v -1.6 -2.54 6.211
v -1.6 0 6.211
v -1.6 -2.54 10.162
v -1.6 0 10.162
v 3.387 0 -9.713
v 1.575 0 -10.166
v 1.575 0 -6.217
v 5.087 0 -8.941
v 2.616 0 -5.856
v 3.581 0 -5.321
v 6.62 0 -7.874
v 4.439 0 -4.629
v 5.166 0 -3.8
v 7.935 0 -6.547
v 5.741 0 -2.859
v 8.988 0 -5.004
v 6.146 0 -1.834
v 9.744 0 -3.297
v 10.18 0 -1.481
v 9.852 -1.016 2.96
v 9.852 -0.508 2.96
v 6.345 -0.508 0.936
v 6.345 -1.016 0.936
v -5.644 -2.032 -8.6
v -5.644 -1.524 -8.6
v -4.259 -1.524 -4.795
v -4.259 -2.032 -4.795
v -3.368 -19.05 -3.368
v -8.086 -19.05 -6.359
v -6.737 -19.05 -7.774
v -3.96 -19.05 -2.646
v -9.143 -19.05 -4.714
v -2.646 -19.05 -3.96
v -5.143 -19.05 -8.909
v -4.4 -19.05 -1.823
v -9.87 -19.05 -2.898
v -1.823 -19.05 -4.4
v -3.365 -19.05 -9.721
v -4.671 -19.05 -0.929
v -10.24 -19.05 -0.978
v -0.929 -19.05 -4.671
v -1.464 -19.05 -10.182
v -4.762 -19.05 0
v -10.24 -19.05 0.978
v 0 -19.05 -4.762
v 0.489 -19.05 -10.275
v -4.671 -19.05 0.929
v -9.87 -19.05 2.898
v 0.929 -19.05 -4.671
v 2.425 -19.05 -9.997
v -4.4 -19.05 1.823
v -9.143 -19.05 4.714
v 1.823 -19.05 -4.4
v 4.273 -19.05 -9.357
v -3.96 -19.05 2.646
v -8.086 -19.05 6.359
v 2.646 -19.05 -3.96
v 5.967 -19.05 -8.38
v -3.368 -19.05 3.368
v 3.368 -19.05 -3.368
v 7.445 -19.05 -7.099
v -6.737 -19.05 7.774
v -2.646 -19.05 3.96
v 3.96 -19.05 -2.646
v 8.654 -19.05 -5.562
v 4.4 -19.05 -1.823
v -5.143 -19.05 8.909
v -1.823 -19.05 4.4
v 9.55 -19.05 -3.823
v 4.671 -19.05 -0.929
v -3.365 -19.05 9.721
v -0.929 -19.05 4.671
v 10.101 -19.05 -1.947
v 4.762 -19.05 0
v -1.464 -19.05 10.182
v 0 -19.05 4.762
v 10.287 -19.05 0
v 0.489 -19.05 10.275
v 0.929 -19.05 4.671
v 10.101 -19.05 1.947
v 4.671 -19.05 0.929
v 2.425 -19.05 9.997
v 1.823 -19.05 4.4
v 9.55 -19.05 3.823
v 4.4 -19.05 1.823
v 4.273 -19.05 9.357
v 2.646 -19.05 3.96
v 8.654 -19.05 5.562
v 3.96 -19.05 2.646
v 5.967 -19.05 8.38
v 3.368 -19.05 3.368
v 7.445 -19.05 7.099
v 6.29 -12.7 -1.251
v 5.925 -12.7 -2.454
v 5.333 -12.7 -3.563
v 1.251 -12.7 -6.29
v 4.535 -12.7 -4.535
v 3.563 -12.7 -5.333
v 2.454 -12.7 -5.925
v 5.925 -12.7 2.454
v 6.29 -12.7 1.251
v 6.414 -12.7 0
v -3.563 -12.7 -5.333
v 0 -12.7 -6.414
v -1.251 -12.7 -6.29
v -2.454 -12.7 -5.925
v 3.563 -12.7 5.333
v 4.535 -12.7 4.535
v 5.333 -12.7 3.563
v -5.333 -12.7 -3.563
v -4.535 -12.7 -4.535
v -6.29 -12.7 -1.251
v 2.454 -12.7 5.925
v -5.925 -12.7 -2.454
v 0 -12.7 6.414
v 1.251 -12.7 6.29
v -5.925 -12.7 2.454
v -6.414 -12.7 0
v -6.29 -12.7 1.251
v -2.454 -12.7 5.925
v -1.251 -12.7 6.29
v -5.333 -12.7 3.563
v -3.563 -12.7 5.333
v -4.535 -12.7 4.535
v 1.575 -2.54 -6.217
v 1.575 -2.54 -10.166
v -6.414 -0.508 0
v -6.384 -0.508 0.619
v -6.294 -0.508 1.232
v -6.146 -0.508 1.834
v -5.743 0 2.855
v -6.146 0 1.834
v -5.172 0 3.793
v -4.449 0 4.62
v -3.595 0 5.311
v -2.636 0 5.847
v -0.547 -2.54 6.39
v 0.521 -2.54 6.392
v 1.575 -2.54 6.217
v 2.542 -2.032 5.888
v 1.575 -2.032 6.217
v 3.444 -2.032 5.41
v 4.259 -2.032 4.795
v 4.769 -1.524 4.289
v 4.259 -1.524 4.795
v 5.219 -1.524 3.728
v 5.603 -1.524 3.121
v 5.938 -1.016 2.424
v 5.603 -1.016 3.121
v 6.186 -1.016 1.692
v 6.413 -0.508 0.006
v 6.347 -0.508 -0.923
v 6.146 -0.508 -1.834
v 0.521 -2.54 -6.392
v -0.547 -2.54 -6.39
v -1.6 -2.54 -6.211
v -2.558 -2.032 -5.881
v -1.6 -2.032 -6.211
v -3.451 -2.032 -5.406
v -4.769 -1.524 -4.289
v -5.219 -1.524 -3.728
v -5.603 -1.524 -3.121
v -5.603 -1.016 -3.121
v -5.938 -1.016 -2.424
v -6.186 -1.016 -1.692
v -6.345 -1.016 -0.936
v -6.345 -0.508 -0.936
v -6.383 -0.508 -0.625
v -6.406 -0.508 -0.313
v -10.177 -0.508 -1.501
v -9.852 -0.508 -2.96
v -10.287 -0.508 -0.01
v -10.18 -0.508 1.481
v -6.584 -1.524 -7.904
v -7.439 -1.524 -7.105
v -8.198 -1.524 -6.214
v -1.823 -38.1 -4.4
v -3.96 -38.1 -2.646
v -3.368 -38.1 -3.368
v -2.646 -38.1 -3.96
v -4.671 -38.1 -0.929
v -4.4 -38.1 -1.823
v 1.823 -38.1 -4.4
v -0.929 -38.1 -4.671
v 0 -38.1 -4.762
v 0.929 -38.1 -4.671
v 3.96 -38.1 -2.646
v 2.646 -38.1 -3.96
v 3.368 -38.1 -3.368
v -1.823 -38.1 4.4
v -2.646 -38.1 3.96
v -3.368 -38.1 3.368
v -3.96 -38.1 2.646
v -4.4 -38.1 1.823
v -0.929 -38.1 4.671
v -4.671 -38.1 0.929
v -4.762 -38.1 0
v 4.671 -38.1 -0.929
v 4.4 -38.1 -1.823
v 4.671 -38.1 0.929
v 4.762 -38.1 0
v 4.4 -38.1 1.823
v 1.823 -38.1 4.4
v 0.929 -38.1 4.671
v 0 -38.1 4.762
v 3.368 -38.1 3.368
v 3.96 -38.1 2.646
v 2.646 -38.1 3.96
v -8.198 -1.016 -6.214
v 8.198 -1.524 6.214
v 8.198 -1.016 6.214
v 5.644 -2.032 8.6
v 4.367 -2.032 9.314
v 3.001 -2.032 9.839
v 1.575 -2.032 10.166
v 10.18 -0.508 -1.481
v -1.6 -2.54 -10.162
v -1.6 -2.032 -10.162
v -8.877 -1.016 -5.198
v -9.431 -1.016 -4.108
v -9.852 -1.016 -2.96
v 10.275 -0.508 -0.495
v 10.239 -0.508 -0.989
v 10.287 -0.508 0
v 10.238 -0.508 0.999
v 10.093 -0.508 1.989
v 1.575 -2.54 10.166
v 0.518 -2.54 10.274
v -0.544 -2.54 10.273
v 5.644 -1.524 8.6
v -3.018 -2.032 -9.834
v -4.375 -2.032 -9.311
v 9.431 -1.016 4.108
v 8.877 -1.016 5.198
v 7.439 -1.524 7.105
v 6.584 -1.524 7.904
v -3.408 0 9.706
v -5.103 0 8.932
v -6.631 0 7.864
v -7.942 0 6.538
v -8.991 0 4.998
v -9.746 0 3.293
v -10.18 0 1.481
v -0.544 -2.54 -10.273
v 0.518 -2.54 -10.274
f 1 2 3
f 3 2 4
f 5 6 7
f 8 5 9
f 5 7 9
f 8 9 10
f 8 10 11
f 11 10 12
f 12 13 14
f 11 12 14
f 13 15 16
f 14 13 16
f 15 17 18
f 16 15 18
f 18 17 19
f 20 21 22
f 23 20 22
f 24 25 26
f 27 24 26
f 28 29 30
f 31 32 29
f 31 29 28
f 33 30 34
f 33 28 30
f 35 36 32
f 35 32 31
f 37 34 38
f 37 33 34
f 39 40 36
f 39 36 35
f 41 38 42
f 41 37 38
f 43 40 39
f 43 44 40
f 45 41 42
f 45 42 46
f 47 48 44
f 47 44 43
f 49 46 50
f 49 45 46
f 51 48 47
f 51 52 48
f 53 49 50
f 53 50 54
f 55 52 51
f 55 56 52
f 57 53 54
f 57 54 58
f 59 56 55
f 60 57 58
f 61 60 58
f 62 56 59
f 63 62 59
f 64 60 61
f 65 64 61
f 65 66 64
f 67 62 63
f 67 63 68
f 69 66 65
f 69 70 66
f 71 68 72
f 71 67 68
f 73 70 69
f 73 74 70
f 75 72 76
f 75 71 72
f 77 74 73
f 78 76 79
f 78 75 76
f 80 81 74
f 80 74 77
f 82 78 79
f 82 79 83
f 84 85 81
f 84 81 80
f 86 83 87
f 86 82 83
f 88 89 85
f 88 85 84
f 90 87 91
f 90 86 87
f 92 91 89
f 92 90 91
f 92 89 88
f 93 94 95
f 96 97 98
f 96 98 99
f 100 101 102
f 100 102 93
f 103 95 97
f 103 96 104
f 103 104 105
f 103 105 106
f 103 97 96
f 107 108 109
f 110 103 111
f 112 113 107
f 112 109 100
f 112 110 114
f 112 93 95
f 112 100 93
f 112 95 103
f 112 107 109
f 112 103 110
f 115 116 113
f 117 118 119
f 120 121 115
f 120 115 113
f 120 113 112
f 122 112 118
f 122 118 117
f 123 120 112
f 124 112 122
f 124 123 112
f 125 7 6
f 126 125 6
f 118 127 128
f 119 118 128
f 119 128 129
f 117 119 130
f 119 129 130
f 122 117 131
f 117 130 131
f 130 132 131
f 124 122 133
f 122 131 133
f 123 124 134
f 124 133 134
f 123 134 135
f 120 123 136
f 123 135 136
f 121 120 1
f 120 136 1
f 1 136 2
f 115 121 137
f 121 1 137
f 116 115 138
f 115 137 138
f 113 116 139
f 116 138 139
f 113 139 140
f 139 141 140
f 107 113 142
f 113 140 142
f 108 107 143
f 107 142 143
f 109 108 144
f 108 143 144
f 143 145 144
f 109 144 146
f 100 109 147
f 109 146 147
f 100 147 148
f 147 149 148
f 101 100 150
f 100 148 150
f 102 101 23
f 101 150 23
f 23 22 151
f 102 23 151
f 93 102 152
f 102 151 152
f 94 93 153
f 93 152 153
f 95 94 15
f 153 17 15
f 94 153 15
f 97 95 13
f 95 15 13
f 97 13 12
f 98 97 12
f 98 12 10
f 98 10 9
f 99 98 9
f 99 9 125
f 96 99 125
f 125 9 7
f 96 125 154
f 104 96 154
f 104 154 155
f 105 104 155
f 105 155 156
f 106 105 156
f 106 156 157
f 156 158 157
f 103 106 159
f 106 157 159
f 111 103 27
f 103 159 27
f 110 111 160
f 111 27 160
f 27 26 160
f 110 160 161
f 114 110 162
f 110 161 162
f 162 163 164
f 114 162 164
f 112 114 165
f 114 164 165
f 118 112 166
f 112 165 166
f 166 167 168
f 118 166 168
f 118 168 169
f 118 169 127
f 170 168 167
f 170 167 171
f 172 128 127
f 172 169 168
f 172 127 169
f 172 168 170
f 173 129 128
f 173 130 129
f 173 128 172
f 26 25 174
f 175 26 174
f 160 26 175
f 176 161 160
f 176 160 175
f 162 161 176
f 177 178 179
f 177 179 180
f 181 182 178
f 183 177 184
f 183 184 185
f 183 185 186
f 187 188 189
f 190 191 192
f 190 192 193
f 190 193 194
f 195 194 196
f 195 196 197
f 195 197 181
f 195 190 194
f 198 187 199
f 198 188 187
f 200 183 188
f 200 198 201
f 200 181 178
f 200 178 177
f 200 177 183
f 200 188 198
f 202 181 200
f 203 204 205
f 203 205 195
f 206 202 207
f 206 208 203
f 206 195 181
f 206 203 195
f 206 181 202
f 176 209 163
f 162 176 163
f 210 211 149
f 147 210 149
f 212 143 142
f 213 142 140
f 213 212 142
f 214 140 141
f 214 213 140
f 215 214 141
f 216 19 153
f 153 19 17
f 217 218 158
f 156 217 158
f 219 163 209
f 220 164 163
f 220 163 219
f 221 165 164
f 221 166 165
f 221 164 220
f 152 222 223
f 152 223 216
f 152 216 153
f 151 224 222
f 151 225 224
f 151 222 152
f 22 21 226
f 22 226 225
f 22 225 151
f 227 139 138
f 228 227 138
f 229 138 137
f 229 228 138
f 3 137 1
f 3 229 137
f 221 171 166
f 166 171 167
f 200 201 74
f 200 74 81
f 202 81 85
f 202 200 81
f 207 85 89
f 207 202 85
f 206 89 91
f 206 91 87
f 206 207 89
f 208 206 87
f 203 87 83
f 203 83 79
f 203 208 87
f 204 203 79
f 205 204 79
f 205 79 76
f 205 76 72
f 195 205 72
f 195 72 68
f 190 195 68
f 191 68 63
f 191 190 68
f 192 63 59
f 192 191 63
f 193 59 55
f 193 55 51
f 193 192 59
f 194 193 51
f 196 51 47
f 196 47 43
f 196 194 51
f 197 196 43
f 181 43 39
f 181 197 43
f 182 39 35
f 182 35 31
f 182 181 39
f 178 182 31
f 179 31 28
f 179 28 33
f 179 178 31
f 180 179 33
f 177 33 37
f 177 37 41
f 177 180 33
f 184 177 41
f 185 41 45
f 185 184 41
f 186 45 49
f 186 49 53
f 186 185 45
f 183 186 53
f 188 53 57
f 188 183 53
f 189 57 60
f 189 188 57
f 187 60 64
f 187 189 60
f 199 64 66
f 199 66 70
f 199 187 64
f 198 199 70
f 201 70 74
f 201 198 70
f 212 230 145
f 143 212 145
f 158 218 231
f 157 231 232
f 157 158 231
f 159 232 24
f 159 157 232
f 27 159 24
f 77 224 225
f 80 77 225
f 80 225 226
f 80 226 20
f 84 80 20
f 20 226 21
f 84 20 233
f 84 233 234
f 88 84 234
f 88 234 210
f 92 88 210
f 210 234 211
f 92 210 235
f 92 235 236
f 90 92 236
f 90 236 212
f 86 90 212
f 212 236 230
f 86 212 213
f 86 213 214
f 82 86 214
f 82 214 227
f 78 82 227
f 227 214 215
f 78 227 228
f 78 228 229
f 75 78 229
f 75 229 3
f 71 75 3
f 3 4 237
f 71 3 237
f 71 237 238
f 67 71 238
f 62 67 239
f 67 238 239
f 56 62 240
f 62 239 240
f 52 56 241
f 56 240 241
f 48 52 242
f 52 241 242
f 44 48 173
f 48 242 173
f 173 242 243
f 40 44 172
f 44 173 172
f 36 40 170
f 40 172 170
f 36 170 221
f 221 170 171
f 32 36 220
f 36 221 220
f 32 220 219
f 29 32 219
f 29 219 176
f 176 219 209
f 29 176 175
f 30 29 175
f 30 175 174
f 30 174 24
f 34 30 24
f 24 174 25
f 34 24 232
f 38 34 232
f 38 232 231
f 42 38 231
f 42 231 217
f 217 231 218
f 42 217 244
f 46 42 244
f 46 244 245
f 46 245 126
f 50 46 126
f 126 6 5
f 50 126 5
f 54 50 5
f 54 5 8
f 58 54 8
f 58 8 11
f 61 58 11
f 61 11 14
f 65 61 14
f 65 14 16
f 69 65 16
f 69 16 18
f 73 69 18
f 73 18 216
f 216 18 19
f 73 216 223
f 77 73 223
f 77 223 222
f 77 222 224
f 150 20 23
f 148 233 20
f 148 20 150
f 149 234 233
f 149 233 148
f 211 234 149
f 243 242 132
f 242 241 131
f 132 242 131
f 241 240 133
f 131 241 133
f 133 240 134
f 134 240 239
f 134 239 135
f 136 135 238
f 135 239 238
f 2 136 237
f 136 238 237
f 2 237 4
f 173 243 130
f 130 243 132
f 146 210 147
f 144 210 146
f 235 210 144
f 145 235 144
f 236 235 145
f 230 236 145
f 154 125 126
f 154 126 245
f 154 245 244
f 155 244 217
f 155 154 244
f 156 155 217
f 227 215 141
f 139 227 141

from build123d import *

# Parameters (mm, degrees)
F0_R      = 10.287
F1_DEPTH  = 38.1
F2_R      = 10.287
F2_R_2    = 4.7625
F3_DEPTH  = 19.05
F4_R      = 6.4135
F5_DEPTH  = 12.7
F7_DEPTH  = 2.54
F9_DEPTH  = 2.032
F11_DEPTH = 1.524
F13_DEPTH = 1.016
F15_DEPTH = 0.508


# Not quite as in the source:
# - a feature names something its author has since deleted; it is built from what else it names


with BuildPart() as f1:
    # F0 (on Front) → F1 (new body)
    with BuildSketch(Plane.XZ):
        Circle(F0_R)
    extrude(amount=F1_DEPTH)

    # F2 (on face) → F3 (cut)
    with BuildSketch(Plane.XZ.offset(38.1)):
        Circle(F2_R)
        Circle(F2_R_2, mode=Mode.SUBTRACT)
    extrude(amount=-F3_DEPTH, mode=Mode.SUBTRACT)

    # F4 (on face) → F5 (cut)
    with BuildSketch(Plane(origin=(0, 0, 0), x_dir=(-1, 0, 0), z_dir=(0, 1, 0))):
        Circle(F4_R)
    extrude(amount=-F5_DEPTH, mode=Mode.SUBTRACT)

    # F6 (on face) → F7 (cut)
    with BuildSketch(Plane(origin=(0, 0, 0), x_dir=(-1, 0, 0), z_dir=(0, 1, 0))):
        with BuildLine():
            ThreePointArc((1.6002, 10.1617778445), (0.0128539811, 10.2869919692), (-1.5748, 10.1657451257))
            Line((-1.5748, 10.1657451257), (-1.5748, 6.217152661))
            ThreePointArc((-1.5748, 6.217152661), (0.013107899, 6.413486605), (1.6002, 6.2106635885))
            Line((1.6002, 6.2106635885), (1.6002, 10.1617778445))
        make_face()
        with BuildLine():
            Line((-1.5748, -6.217152661), (-1.5748, -10.1657451257))
            ThreePointArc((-1.5748, -10.1657451257), (0.0128539811, -10.2869919692), (1.6002, -10.1617778445))
            Line((1.6002, -10.1617778445), (1.6002, -6.2106635885))
            ThreePointArc((1.6002, -6.2106635885), (0.013107899, -6.413486605), (-1.5748, -6.217152661))
        make_face()
    extrude(amount=-F7_DEPTH, mode=Mode.SUBTRACT)

    # F8 (on face) → F9 (cut)
    with BuildSketch(Plane(origin=(0, 0, 0), x_dir=(-1, 0, 0), z_dir=(0, 1, 0))):
        with BuildLine():
            ThreePointArc((-1.5748, 10.1657451257), (-3.6933269708, 9.6011303963), (-5.6440857783, 8.6003874754))
            Line((-5.6440857783, 8.6003874754), (-4.2590825341, 4.795122336))
            ThreePointArc((-4.2590825341, 4.795122336), (-3.0023472345, 5.6673532917), (-1.5748, 6.217152661))
            Line((-1.5748, 6.217152661), (-1.5748, 10.1657451257))
        make_face()
        with BuildLine():
            Line((-1.6895483294, 11.5486066381), (-6.129032147, 9.932766673))
            Line((-6.129032147, 9.932766673), (-5.6440857783, 8.6003874754))
            ThreePointArc((-5.6440857783, 8.6003874754), (-3.6933269708, 9.6011303963), (-1.5748, 10.1657451257))
            Line((-1.5748, 10.1657451257), (-1.5748, 6.217152661))
            ThreePointArc((-1.5748, 6.217152661), (-3.0023472345, 5.6673532917), (-4.2590825341, 4.795122336))
            Line((-4.2590825341, 4.795122336), (1.6895483294, -11.5486066381))
            Line((1.6895483294, -11.5486066381), (6.129032147, -9.932766673))
            Line((6.129032147, -9.932766673), (-1.6895483294, 11.5486066381))
        make_face()
    extrude(amount=-F9_DEPTH, mode=Mode.SUBTRACT)

    # F10 (on face) → F11 (cut)
    with BuildSketch(Plane(origin=(0, 0, 0), x_dir=(-1, 0, 0), z_dir=(0, 1, 0))):
        with BuildLine():
            ThreePointArc((-5.6440857783, 8.6003874754), (-7.0232543947, 7.5163998502), (-8.1981986695, 6.213848049))
            Line((-8.1981986695, 6.213848049), (-5.6029284192, 3.1209254044))
            ThreePointArc((-5.6029284192, 3.1209254044), (-5.0015546435, 4.0146523384), (-4.2590825341, 4.795122336))
            Line((-4.2590825341, 4.795122336), (-5.6440857783, 8.6003874754))
        make_face()
        with BuildLine():
            Line((-5.5958847817, 10.2253004606), (-9.0982399757, 7.2864755091))
            Line((-9.0982399757, 7.2864755091), (-8.1981986695, 6.213848049))
            ThreePointArc((-8.1981986695, 6.213848049), (-7.0232543947, 7.5163998502), (-5.6440857783, 8.6003874754))
            Line((-5.6440857783, 8.6003874754), (-4.2590825341, 4.795122336))
            ThreePointArc((-4.2590825341, 4.795122336), (-5.0015546435, 4.0146523384), (-5.6029284192, 3.1209254044))
            Line((-5.6029284192, 3.1209254044), (5.5958847817, -10.2253004606))
            Line((5.5958847817, -10.2253004606), (9.0982399757, -7.2864755091))
            Line((9.0982399757, -7.2864755091), (-5.5958847817, 10.2253004606))
        make_face()
    extrude(amount=-F11_DEPTH, mode=Mode.SUBTRACT)

    # F12 (on face) → F13 (cut)
    with BuildSketch(Plane(origin=(0, 0, 0), x_dir=(-1, 0, 0), z_dir=(0, 1, 0))):
        with BuildLine():
            Line((-14.7145799005, 11.2231002783), (-17.0767799005, 7.1316498607))
            Line((-17.0767799005, 7.1316498607), (15.3816246724, -11.6082187569))
            Line((15.3816246724, -11.6082187569), (17.7438246724, -7.5167683393))
            Line((17.7438246724, -7.5167683393), (9.8518430547, -2.9603306279))
            ThreePointArc((9.8518430547, -2.9603306279), (9.1704604826, -4.6610109994), (8.1981986695, -6.213848049))
            Line((8.1981986695, -6.213848049), (5.6029284192, -3.1209254044))
            ThreePointArc((5.6029284192, -3.1209254044), (6.0730159591, -2.0619067413), (6.3448917326, -0.935591338))
            Line((6.3448917326, -0.935591338), (-14.7145799005, 11.2231002783))
        make_face()
        with BuildLine():
            Line((9.8518430547, -2.9603306279), (6.3448917326, -0.935591338))
            ThreePointArc((6.3448917326, -0.935591338), (6.0730159591, -2.0619067413), (5.6029284192, -3.1209254044))
            Line((5.6029284192, -3.1209254044), (8.1981986695, -6.213848049))
            ThreePointArc((8.1981986695, -6.213848049), (9.1704604826, -4.6610109994), (9.8518430547, -2.9603306279))
        make_face()
    extrude(amount=-F13_DEPTH, mode=Mode.SUBTRACT)

    # F14 (on face) → F15 (cut)
    with BuildSketch(Plane(origin=(0, 0, 0), x_dir=(-1, 0, 0), z_dir=(0, 1, 0))):
        with BuildLine():
            Line((-25.8091024604, 4.6292271013), (-26.2208610514, -0.0771951304))
            Line((-26.2208610514, -0.0771951304), (-10.1798918612, -1.4805980865))
            ThreePointArc((-10.1798918612, -1.4805980865), (-10.260188024, -0.7422335965), (-10.287, 0))
            ThreePointArc((-10.287, 0), (-10.1776293532, 1.4960714382), (-9.8518430547, 2.9603306279))
            Line((-9.8518430547, 2.9603306279), (-6.3448917326, 0.935591338))
            ThreePointArc((-6.3448917326, 0.935591338), (-6.3969914921, -0.4598718295), (-6.1458227701, -1.8335333998))
            Line((-6.1458227701, -1.8335333998), (22.5503757634, -4.3441254578))
            Line((22.5503757634, -4.3441254578), (22.9621343545, 0.3622967739))
            Line((22.9621343545, 0.3622967739), (-25.8091024604, 4.6292271013))
        make_face()
        with BuildLine():
            ThreePointArc((-10.287, 0), (-10.260188024, -0.7422335965), (-10.1798918612, -1.4805980865))
            Line((-10.1798918612, -1.4805980865), (-6.1458227701, -1.8335333998))
            ThreePointArc((-6.1458227701, -1.8335333998), (-6.3969914921, -0.4598718295), (-6.3448917326, 0.935591338))
            Line((-6.3448917326, 0.935591338), (-9.8518430547, 2.9603306279))
            ThreePointArc((-9.8518430547, 2.9603306279), (-10.1776293532, 1.4960714382), (-10.287, 0))
        make_face()
    extrude(amount=-F15_DEPTH, mode=Mode.SUBTRACT)


solid = f1.part
